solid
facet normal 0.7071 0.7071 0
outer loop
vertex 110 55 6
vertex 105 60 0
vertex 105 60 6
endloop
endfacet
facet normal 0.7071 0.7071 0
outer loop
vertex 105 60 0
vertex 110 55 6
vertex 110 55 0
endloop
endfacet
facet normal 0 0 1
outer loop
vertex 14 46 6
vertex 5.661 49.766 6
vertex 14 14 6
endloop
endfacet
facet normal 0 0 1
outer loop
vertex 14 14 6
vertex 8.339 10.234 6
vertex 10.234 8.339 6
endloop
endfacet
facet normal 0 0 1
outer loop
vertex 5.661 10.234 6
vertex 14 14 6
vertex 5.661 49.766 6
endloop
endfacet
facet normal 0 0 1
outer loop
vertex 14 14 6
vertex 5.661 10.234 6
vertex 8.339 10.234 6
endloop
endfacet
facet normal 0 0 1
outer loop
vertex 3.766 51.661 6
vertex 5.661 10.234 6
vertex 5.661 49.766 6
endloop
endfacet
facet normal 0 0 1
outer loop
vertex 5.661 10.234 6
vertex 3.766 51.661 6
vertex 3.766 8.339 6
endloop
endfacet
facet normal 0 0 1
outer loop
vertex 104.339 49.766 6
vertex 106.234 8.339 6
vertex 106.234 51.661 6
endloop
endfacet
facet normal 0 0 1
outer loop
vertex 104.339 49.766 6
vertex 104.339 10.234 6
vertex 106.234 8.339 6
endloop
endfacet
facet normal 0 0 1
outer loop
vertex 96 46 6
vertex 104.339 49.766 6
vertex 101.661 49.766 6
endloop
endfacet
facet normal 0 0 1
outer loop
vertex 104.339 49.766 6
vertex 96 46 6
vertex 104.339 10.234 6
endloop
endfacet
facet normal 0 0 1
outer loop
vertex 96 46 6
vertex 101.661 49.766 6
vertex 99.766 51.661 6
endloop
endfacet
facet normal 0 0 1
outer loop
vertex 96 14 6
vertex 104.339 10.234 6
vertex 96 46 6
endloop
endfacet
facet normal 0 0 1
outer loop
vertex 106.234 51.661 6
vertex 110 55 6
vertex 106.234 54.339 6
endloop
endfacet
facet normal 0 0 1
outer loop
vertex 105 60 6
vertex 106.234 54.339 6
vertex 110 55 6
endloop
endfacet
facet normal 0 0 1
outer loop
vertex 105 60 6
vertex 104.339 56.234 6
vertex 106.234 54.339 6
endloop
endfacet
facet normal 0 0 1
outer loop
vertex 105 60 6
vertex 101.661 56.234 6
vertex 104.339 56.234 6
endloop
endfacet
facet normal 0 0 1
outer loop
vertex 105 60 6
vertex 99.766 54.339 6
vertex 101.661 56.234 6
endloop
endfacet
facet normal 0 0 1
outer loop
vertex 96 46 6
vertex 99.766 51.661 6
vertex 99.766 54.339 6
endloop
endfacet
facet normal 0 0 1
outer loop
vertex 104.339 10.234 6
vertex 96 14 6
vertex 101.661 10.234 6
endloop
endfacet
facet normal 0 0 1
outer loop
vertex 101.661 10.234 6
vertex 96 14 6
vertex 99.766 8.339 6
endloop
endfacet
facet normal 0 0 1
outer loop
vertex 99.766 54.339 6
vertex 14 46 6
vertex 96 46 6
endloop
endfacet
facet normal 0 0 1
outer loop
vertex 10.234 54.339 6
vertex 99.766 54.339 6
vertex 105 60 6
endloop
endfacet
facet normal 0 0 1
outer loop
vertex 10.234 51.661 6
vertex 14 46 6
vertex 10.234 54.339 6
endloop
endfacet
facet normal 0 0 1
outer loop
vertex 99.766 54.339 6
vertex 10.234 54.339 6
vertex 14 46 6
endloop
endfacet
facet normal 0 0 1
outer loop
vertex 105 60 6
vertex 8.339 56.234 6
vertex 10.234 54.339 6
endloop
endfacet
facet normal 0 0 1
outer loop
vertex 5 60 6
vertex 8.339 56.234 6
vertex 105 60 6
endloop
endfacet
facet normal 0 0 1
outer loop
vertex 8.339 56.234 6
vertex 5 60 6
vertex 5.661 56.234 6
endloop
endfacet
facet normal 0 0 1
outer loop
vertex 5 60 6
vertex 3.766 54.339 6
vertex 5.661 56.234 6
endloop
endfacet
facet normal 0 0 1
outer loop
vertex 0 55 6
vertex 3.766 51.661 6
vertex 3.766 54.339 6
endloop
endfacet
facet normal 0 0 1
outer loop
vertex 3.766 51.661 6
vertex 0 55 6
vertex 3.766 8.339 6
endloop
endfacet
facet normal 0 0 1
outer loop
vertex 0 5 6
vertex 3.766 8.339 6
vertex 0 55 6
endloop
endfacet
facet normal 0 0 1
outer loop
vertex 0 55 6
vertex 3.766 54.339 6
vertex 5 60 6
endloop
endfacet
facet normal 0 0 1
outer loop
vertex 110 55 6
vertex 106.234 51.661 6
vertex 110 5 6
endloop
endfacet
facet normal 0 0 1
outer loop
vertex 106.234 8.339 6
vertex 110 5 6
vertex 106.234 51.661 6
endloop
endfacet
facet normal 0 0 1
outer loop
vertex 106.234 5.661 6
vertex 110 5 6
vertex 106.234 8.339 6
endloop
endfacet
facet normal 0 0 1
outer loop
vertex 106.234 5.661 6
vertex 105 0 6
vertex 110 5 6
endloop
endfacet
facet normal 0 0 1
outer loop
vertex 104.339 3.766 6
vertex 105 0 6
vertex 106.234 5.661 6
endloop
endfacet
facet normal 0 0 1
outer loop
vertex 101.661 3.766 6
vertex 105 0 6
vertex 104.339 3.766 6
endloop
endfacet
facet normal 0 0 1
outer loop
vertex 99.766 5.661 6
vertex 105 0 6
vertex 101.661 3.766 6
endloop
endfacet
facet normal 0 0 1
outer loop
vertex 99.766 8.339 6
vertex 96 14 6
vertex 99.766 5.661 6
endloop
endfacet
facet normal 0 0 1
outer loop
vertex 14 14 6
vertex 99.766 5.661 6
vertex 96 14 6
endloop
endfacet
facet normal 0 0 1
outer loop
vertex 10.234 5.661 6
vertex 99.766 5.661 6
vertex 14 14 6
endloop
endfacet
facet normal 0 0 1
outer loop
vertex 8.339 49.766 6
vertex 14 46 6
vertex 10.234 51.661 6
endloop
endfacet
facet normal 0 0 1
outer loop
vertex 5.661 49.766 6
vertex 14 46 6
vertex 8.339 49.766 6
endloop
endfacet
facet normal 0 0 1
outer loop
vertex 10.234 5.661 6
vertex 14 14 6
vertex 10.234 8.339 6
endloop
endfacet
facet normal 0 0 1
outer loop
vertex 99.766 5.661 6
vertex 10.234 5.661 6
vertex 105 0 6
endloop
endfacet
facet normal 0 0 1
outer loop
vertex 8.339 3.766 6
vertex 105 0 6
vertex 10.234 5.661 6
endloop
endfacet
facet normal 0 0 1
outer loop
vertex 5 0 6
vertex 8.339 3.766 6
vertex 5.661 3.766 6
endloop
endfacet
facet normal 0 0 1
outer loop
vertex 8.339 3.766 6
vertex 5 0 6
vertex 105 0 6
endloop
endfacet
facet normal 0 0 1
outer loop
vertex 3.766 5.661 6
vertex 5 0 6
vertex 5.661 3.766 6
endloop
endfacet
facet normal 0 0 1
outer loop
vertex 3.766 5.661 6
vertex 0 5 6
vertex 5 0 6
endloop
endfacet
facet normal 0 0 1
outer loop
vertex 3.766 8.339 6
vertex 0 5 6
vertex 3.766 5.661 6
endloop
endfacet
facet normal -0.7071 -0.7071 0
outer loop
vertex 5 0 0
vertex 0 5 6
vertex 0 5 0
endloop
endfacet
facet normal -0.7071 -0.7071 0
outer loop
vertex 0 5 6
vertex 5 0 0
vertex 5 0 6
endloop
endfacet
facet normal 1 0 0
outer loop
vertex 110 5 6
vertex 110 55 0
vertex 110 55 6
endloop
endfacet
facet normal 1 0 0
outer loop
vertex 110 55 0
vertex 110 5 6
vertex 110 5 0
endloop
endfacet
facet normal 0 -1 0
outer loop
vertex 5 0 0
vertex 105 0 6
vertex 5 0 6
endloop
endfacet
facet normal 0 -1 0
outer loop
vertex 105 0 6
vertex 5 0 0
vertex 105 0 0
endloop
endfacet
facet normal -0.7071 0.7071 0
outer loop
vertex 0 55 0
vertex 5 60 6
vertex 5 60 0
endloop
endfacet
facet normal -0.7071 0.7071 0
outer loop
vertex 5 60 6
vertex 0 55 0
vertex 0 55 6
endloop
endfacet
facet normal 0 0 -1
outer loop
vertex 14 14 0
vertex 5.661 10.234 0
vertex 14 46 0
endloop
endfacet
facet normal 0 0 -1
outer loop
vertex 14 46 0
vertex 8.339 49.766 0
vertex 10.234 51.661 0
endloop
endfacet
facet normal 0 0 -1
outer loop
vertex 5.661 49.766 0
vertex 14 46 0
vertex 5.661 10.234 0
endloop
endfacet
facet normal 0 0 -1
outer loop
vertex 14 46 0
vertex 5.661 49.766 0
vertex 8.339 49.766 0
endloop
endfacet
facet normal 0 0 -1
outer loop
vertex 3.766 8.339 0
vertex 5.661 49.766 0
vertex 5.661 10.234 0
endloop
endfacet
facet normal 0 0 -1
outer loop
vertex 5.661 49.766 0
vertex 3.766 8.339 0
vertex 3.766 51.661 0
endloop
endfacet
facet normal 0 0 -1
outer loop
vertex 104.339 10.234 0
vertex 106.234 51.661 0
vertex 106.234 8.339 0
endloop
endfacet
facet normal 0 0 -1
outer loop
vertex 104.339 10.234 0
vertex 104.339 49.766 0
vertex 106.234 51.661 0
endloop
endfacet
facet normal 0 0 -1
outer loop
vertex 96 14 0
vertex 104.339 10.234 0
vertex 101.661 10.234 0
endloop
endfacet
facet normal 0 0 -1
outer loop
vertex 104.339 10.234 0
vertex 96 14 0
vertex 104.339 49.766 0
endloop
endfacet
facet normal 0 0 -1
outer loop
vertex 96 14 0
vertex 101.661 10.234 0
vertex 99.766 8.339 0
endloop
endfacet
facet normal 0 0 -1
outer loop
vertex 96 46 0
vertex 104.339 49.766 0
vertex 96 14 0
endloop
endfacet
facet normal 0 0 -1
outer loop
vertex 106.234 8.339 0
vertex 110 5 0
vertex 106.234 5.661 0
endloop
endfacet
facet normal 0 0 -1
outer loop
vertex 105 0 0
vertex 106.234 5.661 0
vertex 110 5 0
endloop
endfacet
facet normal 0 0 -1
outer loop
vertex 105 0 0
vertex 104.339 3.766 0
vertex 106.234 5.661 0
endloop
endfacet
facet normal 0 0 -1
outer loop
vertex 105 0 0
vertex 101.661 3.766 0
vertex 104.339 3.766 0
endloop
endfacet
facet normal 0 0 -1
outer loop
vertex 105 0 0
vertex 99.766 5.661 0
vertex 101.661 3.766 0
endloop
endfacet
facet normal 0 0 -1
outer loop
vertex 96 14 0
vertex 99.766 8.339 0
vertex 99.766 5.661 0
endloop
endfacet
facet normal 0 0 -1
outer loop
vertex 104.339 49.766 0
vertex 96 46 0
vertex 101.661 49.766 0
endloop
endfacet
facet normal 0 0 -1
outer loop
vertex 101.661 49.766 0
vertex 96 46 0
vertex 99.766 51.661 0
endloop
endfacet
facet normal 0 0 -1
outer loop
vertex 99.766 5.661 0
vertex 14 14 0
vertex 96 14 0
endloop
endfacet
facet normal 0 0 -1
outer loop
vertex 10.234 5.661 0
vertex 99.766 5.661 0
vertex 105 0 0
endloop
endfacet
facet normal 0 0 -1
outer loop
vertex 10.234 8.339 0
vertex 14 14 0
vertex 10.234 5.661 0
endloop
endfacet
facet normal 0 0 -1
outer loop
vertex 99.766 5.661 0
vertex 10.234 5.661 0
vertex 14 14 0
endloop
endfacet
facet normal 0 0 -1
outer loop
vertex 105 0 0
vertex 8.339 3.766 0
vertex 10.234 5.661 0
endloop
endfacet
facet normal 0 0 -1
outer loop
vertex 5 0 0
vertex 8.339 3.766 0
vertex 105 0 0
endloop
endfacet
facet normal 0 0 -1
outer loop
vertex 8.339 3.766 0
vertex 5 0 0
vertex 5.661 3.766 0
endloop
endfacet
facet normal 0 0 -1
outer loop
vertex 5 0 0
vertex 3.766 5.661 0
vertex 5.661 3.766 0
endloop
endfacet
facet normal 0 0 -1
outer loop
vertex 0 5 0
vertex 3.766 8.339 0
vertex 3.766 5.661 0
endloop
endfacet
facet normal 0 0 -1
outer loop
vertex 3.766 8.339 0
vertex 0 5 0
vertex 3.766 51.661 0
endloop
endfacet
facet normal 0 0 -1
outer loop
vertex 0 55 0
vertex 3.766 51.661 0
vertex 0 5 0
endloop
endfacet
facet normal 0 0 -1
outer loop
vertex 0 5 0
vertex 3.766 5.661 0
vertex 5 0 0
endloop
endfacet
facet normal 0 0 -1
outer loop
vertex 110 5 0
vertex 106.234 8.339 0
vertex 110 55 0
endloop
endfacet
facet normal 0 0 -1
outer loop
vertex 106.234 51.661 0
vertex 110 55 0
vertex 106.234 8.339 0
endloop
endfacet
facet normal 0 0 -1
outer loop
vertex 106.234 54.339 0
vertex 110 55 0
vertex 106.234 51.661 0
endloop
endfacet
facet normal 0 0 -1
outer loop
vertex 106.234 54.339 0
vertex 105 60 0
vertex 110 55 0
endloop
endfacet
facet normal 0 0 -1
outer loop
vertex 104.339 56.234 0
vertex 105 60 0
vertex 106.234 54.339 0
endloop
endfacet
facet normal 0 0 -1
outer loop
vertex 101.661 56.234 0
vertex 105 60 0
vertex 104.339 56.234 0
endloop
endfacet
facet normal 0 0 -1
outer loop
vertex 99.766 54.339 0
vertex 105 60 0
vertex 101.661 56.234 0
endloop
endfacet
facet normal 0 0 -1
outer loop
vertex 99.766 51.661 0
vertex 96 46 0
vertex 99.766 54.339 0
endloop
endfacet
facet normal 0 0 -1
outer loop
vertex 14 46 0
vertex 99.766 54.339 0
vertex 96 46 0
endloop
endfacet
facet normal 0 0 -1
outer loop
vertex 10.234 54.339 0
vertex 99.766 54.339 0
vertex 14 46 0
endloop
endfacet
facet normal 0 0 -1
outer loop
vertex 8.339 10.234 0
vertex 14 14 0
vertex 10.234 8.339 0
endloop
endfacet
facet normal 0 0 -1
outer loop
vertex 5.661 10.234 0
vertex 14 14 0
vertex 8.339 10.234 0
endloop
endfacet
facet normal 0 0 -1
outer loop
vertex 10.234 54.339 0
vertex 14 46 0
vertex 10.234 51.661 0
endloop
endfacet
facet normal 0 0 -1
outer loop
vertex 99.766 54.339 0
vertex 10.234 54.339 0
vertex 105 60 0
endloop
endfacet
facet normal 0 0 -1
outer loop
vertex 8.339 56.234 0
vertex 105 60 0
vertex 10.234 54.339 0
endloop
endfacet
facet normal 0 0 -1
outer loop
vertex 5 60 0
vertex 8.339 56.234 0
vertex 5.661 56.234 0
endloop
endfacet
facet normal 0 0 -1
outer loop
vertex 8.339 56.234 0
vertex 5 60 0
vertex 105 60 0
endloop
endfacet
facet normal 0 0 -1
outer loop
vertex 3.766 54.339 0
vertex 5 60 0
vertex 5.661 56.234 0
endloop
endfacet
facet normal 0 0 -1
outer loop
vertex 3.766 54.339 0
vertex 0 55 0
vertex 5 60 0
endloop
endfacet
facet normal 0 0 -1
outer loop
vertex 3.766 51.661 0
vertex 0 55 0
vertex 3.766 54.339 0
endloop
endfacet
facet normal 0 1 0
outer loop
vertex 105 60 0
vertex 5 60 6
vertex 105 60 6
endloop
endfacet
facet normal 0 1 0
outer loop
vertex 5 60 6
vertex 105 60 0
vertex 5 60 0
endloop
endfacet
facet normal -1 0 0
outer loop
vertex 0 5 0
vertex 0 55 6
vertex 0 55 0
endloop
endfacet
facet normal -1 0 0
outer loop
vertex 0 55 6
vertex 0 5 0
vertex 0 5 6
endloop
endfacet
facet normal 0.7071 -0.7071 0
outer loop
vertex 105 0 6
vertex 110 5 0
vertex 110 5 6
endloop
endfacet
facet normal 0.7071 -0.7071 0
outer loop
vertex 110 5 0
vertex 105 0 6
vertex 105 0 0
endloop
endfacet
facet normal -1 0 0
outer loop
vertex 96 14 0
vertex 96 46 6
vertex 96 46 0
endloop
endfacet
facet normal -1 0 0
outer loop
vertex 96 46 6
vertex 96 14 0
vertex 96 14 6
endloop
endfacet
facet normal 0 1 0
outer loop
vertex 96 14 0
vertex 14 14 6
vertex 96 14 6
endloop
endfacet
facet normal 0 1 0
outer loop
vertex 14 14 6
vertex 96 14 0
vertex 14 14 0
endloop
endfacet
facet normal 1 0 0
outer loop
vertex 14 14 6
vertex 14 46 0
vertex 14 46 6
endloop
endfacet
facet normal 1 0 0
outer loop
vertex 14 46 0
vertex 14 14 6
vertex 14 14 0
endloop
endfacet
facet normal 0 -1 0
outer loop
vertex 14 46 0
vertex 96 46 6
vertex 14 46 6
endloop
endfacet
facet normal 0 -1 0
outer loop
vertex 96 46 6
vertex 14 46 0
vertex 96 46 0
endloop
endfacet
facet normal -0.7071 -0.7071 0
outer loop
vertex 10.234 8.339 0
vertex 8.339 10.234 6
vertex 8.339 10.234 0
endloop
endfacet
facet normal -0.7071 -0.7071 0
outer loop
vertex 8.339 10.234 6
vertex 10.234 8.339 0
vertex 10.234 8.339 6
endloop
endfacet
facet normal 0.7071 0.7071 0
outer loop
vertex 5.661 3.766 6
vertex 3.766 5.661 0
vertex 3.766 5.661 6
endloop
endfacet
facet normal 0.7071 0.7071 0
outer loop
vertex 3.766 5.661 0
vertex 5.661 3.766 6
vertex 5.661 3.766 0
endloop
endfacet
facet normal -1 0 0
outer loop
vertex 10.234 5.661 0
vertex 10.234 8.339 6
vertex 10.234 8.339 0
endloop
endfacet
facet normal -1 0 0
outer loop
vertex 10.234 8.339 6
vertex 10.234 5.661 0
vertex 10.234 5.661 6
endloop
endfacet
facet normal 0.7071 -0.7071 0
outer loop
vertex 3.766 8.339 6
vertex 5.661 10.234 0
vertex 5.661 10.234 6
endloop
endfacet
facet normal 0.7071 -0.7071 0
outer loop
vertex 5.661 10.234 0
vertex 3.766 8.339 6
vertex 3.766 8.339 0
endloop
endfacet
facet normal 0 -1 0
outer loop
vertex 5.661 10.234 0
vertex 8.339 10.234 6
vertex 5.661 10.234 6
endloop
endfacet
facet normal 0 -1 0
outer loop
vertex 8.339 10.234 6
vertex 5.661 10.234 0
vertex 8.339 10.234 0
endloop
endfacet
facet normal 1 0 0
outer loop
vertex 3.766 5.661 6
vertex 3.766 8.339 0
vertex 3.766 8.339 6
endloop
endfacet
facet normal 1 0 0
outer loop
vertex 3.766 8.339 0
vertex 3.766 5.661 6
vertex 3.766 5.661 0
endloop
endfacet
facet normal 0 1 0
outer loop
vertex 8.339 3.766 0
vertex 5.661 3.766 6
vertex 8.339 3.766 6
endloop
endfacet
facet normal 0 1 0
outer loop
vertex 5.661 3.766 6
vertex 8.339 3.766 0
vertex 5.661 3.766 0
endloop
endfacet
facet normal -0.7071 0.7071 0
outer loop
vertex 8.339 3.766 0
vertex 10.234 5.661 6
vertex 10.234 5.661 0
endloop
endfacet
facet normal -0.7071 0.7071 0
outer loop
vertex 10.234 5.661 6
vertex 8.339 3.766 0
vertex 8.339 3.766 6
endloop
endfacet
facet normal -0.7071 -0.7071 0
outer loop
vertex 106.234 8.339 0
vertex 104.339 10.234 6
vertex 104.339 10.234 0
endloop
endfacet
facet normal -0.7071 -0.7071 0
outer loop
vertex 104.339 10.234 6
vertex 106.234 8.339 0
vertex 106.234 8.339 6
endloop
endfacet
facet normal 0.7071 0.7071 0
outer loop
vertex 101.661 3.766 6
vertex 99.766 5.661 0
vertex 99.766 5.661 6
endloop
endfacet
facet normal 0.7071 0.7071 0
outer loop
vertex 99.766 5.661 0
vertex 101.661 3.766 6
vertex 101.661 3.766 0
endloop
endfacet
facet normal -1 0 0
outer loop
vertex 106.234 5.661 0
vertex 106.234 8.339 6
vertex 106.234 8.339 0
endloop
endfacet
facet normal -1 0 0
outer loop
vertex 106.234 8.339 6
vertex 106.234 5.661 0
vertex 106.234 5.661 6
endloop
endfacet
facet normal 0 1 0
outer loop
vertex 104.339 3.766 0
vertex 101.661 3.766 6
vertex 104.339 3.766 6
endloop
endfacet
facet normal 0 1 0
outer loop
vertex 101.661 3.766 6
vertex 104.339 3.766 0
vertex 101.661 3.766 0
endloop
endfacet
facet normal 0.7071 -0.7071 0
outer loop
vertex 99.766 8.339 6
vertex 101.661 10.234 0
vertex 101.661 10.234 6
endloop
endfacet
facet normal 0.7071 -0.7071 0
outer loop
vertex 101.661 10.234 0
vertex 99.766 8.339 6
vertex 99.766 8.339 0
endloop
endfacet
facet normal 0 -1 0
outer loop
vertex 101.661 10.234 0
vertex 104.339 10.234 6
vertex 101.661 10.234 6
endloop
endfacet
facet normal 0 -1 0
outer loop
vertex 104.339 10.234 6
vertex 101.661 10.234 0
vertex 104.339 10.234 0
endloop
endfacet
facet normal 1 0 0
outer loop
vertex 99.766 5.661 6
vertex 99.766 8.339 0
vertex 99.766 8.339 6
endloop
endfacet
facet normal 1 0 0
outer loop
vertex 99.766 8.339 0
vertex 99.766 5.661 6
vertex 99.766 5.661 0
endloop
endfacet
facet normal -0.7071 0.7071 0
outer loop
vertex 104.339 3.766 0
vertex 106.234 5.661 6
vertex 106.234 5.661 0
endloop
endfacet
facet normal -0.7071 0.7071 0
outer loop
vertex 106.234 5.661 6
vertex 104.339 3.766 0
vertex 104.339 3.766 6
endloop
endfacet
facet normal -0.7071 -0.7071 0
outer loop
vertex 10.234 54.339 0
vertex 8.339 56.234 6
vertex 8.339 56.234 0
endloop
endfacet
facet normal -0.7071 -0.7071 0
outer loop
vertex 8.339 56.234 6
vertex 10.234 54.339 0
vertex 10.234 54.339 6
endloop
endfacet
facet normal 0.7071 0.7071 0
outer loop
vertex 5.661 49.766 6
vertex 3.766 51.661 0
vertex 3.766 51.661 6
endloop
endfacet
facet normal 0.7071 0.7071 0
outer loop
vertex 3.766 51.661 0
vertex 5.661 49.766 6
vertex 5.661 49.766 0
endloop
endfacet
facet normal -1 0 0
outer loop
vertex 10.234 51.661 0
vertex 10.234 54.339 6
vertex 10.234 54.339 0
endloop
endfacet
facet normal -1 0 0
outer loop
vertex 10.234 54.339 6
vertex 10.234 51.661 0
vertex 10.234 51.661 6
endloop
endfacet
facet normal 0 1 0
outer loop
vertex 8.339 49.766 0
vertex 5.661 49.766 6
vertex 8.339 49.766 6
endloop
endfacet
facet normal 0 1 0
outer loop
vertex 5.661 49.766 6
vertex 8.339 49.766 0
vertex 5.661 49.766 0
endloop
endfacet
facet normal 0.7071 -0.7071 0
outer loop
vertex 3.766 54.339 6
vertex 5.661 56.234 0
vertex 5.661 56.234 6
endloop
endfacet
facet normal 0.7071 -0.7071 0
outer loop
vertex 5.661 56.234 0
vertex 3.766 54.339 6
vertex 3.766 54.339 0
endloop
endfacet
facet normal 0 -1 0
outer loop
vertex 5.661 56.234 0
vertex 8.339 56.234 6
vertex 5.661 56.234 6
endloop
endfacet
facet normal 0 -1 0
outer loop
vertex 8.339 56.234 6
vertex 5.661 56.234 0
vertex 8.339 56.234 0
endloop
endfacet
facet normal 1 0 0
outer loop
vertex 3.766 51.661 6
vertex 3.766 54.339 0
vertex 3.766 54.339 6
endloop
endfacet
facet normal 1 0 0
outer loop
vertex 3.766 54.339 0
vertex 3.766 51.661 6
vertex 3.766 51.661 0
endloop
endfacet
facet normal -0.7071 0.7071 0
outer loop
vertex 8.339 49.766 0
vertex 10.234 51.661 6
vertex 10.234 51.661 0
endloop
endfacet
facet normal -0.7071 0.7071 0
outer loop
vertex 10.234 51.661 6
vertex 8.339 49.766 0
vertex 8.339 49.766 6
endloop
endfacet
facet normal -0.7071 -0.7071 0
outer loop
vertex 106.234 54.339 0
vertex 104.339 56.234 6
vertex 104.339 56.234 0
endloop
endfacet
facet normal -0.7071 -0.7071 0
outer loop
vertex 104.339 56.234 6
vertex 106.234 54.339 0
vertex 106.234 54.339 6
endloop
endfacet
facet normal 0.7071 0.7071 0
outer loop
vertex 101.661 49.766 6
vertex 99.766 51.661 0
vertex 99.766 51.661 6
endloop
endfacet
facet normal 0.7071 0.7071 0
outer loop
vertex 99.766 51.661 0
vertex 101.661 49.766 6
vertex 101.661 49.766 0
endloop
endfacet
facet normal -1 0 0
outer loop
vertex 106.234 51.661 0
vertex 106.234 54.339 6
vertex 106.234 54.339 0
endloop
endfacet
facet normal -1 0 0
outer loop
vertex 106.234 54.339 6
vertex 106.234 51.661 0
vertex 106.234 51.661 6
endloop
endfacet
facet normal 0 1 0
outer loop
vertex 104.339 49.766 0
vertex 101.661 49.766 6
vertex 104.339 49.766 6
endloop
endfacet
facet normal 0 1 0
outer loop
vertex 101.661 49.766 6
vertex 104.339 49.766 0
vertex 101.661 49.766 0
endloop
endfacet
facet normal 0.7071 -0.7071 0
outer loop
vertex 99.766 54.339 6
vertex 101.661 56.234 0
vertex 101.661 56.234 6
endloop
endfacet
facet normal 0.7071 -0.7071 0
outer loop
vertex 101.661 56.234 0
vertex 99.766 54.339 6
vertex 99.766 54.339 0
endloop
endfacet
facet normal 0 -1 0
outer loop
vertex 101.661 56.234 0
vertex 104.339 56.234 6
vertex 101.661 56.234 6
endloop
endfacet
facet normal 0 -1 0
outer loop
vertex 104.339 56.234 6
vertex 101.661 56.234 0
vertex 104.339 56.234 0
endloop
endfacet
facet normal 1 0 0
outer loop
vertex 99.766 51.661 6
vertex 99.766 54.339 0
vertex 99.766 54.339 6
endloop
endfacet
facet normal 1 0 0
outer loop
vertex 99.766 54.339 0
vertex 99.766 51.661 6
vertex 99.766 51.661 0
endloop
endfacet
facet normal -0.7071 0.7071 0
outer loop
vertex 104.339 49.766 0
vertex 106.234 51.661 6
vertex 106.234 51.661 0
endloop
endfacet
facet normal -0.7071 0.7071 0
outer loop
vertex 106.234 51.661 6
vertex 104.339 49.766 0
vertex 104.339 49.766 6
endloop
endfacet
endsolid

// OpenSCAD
$fn = 32;

// ----------------------------------------------------------------------
// Frame plate: 110 x 60 frame, 14 mm rails
// ----------------------------------------------------------------------

// --- parameters (mm) ---
plate_l = 110;            // plate length, X
plate_w = 60;             // plate width, Y
plate_t = 6;              // plate thickness, Z (extrusion height)
corner_c = 5;             // corner chamfer
frame_bar = 14;           // frame rail width
bolt_r = 3.5;             // corner bolt window radius
bolt_inset = 7;           // bolt centre inset from the edges

win_l = plate_l - 2 * frame_bar;  // window length
win_w = plate_w - 2 * frame_bar;  // window width
bolt_d = 2 * bolt_r;  // corner hole diameter

profile = [[5, 0], [105, 0], [110, 5], [110, 55], [105, 60], [5, 60], [0, 55], [0, 5]];  // primary outline, 8 points, counter clockwise
void_1 = [[14, 14], [96, 14], [96, 46], [14, 46]];  // the window, 4 points
void_2 = [[10.234, 8.339], [8.339, 10.234], [5.661, 10.234], [3.766, 8.339], [3.766, 5.661], [5.661, 3.766], [8.339, 3.766], [10.234, 5.661]];  // corner bolt window, 8 points
void_3 = [[106.234, 8.339], [104.339, 10.234], [101.661, 10.234], [99.766, 8.339], [99.766, 5.661], [101.661, 3.766], [104.339, 3.766], [106.234, 5.661]];  // corner bolt window, 8 points
void_4 = [[10.234, 54.339], [8.339, 56.234], [5.661, 56.234], [3.766, 54.339], [3.766, 51.661], [5.661, 49.766], [8.339, 49.766], [10.234, 51.661]];  // corner bolt window, 8 points
void_5 = [[106.234, 54.339], [104.339, 56.234], [101.661, 56.234], [99.766, 54.339], [99.766, 51.661], [101.661, 49.766], [104.339, 49.766], [106.234, 51.661]];  // corner bolt window, 8 points

// --- the one profile operation ---
difference() {
  linear_extrude(height = plate_t) polygon(points = profile);
  translate([0, 0, -1])
    linear_extrude(height = plate_t + 2) polygon(points = void_1);
  translate([0, 0, -1])
    linear_extrude(height = plate_t + 2) polygon(points = void_2);
  translate([0, 0, -1])
    linear_extrude(height = plate_t + 2) polygon(points = void_3);
  translate([0, 0, -1])
    linear_extrude(height = plate_t + 2) polygon(points = void_4);
  translate([0, 0, -1])
    linear_extrude(height = plate_t + 2) polygon(points = void_5);
}
